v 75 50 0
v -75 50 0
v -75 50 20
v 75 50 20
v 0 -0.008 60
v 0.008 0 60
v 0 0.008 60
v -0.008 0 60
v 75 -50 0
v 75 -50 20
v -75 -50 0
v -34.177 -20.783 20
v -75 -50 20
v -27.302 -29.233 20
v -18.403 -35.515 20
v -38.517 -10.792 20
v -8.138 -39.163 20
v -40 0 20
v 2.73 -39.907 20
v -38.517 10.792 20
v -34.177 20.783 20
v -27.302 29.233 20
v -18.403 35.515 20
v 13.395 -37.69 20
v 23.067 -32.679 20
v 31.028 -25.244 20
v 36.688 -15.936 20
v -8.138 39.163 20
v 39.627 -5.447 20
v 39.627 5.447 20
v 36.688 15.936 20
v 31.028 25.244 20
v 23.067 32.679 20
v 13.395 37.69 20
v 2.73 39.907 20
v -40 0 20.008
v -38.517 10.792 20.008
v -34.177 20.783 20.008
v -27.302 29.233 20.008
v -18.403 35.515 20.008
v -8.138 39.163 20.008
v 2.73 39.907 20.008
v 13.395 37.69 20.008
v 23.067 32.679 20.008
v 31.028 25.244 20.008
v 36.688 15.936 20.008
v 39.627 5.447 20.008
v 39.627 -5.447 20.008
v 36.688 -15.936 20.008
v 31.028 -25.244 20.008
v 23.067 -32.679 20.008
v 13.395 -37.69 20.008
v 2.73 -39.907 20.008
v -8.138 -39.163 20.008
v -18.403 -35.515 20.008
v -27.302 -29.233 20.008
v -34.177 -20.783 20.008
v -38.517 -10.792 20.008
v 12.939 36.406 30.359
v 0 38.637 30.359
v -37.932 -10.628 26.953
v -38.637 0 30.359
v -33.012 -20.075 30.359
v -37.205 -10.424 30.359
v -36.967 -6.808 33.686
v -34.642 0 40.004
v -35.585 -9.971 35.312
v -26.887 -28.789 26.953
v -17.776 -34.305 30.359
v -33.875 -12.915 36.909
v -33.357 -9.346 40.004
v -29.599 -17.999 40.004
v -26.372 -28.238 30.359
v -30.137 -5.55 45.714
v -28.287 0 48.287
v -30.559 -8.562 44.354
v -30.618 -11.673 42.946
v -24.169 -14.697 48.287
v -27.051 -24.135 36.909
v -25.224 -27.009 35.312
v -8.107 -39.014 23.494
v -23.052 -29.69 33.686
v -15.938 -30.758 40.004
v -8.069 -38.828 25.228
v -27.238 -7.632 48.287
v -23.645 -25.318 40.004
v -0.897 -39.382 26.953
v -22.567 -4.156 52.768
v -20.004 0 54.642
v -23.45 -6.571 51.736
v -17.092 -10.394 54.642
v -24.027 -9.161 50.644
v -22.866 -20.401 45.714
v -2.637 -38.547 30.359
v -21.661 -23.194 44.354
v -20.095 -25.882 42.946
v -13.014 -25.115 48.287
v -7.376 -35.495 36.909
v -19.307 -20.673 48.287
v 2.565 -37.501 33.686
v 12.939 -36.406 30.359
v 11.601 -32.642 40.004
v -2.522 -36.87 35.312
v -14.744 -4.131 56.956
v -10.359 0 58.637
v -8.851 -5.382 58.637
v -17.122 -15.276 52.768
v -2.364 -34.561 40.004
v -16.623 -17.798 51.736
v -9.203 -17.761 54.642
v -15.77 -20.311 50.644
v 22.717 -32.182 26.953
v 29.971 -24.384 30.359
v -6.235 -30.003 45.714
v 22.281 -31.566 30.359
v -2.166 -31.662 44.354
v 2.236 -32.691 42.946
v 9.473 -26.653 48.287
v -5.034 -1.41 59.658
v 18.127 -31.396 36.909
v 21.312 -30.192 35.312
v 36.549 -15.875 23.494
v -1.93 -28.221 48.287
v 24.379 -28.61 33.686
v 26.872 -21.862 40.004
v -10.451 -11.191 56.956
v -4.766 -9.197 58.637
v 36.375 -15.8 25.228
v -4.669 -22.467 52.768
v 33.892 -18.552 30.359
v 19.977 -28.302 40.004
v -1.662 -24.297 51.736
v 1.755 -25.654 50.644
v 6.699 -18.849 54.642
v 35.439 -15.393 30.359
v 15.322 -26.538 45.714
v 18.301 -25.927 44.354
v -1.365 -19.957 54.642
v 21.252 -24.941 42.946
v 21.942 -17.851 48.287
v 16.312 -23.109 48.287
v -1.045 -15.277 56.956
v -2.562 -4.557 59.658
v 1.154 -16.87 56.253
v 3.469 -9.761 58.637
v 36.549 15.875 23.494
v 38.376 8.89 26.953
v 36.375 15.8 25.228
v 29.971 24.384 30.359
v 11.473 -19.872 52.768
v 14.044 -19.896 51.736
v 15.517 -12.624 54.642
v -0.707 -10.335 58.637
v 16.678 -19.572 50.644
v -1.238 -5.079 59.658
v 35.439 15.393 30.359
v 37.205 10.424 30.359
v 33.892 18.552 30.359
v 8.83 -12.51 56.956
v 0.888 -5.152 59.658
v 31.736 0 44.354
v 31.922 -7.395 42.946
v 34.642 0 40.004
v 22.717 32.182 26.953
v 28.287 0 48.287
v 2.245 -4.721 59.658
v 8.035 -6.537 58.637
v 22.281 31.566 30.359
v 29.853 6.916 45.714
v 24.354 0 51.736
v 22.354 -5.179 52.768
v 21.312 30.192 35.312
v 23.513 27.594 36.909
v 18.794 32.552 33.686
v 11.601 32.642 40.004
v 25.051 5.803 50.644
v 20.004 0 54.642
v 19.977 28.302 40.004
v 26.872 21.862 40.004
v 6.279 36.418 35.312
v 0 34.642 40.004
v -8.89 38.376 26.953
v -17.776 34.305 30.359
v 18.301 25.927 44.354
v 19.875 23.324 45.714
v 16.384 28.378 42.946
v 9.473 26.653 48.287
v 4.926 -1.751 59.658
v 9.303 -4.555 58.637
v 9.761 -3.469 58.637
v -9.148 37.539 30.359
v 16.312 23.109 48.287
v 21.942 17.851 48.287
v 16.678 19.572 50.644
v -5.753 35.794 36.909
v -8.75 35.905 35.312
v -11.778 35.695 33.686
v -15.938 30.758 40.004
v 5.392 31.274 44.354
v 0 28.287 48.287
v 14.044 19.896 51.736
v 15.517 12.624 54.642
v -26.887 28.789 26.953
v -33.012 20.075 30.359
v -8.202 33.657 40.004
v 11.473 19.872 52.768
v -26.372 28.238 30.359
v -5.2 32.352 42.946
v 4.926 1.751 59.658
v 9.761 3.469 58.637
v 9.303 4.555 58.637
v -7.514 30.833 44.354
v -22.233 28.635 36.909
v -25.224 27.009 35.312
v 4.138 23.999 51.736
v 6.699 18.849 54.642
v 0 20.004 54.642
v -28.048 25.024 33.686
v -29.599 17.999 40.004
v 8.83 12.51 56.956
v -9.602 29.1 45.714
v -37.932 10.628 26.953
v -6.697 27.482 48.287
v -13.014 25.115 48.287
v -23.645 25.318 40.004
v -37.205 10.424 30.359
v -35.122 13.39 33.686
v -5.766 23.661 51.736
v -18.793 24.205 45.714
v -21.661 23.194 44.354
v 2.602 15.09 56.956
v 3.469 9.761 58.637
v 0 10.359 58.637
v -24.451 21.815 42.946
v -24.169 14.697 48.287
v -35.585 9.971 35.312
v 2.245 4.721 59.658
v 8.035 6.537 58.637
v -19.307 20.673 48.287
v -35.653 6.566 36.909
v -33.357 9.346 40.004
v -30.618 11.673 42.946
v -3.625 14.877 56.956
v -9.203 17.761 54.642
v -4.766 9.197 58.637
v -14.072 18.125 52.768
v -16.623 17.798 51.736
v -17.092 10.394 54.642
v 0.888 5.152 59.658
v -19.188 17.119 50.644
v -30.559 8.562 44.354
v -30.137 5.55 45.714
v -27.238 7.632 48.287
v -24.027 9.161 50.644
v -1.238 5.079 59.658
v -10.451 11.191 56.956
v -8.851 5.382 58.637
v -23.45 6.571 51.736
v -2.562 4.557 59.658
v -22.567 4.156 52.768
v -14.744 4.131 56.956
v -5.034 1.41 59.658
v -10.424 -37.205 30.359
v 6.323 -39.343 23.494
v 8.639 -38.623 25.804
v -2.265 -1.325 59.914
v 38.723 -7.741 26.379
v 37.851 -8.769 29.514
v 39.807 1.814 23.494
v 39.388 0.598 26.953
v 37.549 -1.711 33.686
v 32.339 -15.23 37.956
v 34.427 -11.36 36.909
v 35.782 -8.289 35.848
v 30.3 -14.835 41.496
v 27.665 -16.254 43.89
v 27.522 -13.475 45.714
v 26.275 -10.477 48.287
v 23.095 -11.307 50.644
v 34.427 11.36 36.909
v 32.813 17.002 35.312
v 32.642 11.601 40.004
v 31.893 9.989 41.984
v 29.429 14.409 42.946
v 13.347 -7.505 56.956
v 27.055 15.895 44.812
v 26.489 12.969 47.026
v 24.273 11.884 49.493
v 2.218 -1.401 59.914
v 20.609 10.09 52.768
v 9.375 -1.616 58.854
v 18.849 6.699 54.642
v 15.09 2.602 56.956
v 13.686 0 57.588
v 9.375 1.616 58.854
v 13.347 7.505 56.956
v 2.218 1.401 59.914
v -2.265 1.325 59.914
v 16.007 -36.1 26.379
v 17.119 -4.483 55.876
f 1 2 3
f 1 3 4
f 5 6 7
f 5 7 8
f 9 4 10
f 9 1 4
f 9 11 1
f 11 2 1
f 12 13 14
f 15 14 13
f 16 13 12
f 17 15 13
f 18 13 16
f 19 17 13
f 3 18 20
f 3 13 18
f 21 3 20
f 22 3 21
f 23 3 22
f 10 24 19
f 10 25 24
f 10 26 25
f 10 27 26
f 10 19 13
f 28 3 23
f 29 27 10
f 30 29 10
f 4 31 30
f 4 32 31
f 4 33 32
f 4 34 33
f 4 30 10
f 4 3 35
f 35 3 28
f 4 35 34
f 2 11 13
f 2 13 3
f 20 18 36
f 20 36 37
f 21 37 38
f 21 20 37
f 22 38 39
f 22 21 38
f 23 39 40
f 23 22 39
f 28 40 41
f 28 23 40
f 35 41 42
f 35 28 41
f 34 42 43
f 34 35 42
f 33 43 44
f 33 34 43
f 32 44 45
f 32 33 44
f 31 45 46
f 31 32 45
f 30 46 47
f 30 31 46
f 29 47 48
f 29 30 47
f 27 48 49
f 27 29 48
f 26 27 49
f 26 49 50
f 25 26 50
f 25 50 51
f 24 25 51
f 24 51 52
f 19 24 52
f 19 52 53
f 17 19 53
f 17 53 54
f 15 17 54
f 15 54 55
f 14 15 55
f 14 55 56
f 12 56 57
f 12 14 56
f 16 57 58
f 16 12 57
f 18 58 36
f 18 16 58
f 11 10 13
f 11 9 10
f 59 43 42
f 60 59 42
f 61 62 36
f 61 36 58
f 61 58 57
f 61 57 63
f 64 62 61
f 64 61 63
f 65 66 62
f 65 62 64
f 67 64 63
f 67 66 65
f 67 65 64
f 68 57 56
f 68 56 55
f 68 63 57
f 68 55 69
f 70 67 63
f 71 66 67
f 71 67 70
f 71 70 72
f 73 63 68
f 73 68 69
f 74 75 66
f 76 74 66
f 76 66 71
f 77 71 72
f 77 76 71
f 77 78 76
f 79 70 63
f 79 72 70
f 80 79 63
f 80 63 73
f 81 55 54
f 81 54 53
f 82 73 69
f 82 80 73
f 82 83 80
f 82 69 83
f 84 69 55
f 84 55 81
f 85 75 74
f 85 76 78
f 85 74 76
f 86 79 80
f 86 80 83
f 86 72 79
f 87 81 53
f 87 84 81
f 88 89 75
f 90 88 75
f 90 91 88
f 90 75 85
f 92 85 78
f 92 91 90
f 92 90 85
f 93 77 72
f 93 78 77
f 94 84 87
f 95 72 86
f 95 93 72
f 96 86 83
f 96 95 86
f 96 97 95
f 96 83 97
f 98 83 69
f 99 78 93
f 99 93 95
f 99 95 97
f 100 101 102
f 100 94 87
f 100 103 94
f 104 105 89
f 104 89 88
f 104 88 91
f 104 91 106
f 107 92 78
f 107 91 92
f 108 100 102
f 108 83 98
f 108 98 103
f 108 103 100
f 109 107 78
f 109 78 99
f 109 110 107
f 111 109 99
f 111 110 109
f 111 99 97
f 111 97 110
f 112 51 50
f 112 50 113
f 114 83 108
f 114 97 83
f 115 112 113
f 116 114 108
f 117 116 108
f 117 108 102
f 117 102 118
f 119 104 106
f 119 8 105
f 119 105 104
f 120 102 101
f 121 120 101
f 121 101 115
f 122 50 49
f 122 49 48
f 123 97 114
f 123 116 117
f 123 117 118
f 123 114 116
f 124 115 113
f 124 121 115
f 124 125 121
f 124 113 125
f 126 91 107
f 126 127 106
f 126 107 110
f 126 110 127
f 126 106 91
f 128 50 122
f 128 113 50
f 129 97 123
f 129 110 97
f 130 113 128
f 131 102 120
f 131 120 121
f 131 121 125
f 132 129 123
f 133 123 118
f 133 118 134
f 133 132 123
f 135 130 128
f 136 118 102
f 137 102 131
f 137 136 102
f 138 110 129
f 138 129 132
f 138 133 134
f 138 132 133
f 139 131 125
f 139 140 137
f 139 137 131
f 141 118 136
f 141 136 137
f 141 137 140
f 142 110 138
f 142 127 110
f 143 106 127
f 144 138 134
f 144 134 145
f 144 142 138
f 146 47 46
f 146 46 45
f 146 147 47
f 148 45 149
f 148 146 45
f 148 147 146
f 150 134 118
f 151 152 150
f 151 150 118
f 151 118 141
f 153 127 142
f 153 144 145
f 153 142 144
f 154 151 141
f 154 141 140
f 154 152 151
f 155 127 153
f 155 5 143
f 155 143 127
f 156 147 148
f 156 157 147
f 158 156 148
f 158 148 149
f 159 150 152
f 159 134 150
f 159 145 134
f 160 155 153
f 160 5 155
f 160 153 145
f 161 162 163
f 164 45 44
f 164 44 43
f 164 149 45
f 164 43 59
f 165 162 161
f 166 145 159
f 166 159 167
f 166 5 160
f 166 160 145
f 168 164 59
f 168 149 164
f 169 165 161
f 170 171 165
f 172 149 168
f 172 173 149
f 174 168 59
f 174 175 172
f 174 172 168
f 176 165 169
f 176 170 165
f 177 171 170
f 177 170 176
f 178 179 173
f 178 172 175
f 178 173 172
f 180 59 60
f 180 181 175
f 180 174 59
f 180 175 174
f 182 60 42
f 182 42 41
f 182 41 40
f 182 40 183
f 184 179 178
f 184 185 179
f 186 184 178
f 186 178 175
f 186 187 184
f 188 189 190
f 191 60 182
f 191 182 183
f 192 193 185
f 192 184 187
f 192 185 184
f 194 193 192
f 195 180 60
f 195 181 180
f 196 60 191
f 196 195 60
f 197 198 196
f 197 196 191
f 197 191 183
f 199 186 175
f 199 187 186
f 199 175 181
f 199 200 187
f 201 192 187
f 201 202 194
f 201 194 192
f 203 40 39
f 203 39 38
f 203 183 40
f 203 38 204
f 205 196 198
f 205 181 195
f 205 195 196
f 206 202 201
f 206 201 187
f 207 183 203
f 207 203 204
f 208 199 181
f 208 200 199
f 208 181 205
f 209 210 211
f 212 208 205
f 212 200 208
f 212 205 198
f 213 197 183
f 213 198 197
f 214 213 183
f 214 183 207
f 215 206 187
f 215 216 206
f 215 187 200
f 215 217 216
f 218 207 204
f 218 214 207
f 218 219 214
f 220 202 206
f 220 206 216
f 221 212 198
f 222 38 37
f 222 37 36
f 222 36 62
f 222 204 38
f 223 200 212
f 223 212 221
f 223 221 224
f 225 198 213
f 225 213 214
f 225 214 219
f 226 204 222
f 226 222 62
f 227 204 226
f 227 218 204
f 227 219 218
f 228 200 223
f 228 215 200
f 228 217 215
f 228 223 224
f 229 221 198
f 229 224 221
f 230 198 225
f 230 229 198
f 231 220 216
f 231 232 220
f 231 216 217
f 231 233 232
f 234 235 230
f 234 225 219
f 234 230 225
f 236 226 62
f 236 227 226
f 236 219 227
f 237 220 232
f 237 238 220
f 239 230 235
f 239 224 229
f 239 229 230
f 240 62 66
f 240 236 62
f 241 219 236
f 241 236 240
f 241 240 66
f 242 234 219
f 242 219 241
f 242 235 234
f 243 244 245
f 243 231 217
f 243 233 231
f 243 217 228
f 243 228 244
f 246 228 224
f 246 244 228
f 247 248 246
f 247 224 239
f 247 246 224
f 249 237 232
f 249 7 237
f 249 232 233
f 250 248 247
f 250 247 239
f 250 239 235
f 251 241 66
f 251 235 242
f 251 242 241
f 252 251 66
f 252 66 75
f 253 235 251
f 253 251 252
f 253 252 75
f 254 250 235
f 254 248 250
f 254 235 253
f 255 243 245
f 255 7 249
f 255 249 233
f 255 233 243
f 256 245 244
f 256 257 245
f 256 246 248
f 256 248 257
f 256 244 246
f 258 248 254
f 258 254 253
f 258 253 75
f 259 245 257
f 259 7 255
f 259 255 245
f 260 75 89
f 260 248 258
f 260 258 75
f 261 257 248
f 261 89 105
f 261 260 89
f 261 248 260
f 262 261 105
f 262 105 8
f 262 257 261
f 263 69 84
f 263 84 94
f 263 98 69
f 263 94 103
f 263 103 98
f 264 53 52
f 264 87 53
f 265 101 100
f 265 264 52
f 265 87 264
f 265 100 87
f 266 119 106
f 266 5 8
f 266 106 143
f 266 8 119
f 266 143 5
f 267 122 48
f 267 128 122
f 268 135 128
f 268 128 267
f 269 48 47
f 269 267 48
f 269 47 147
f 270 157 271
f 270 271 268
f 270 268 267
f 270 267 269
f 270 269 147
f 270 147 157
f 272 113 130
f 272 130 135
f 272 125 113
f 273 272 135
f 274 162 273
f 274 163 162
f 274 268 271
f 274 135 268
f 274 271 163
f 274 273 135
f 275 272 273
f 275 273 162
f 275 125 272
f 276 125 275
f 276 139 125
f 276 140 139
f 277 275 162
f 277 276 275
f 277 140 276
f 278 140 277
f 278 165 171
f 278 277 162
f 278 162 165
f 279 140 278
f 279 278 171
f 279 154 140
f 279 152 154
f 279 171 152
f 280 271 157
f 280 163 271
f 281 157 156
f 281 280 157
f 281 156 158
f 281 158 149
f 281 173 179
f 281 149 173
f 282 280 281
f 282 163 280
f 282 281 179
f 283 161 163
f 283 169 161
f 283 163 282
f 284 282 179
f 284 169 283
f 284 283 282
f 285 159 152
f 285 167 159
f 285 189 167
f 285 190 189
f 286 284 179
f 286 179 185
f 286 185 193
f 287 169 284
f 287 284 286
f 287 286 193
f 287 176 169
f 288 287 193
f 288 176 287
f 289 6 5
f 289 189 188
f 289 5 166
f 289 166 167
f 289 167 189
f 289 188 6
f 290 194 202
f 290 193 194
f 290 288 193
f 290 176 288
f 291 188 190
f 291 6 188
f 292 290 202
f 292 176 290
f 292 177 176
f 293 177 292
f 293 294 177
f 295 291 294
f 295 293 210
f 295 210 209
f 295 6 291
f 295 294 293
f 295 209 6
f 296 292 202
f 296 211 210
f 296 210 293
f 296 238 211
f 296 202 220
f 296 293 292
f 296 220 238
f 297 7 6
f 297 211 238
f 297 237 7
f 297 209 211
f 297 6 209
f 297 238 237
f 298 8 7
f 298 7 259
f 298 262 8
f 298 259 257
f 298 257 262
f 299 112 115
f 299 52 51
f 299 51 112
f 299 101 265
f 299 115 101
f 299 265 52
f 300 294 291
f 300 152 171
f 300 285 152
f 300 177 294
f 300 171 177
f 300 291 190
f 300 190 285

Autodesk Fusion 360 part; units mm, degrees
sketch "Sketch1" plane through (0, 0, 0) normal (0, 0, 1) x (1, 0, 0)
  line L0 (-75, 50) -> (75, 50)
  line L1 (75, 50) -> (75, -50)
  line L2 (75, -50) -> (-75, -50)
  line L3 (-75, -50) -> (-75, 50)
  line L4 (-75, 50) -> (75, -50) construction
  line L5 (75, 50) -> (-75, -50) construction
  dimension "d1" = 150
  dimension "d2" = 100
extrude "Extrude1" add sketch "Sketch1" along normal blind 20
sketch "Sketch2" plane through (0, 0, 20) normal (0, 0, 1) x (-1, 0, 0)
  line L0 (75, 50) -> (-75, 50)
  line L1 (-75, 50) -> (-75, -50)
  line L2 (-75, -50) -> (75, -50)
  line L3 (75, -50) -> (75, 50)
  circle A0 centre (0, 0) radius 40
  dimension "d5" = 80
extrude "Extrude2" add sketch "Sketch2" along normal blind 40 contours A0
fillet "Fillet1" radius 40 1 edges at (37.2931, 14.4646, 60)
